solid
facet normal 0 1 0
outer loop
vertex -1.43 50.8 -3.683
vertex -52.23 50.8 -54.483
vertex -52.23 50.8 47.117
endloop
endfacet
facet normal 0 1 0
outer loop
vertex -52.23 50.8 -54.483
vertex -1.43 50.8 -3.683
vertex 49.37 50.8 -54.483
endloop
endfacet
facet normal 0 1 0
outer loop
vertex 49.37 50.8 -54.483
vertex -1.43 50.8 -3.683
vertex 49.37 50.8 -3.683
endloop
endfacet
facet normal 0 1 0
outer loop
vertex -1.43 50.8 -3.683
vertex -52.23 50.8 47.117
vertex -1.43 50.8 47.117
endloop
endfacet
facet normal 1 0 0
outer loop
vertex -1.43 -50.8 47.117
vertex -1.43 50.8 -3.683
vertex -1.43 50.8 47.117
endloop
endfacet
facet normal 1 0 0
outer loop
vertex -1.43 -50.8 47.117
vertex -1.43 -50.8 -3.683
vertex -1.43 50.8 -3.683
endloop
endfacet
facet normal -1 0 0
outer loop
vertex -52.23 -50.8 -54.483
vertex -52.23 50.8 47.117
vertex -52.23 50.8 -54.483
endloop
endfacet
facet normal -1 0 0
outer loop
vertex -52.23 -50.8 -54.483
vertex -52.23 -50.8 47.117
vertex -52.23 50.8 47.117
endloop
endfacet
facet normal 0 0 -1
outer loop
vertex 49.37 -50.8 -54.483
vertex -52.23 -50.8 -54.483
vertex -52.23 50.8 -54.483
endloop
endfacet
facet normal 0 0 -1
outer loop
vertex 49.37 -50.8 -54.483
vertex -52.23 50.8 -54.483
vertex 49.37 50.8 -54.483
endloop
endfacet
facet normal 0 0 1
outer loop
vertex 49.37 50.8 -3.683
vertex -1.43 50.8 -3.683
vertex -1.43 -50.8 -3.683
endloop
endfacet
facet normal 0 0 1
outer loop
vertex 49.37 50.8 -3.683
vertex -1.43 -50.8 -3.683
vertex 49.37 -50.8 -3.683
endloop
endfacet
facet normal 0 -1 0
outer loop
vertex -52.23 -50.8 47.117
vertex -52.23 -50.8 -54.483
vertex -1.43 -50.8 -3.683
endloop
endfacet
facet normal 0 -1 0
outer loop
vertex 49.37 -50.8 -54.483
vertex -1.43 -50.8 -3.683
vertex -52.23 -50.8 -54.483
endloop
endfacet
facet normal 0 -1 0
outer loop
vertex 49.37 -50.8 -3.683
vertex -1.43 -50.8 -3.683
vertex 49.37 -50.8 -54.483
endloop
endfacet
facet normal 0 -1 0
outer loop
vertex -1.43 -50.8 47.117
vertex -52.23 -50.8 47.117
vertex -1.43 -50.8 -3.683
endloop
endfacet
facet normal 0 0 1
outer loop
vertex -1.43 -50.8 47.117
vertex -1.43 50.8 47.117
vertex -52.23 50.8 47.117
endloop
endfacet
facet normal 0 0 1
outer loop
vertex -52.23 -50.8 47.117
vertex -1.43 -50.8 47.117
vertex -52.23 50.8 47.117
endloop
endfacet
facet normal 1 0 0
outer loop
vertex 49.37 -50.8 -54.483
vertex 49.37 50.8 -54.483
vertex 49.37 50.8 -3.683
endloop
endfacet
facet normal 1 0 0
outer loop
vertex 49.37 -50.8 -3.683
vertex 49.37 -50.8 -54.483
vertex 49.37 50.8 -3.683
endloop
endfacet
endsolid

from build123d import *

# Parameters (mm, degrees)
F0_W     = 50.8
F0_H     = 50.8
F1_DEPTH = 50.8


with BuildPart() as f1:
    # F0 (on Front) → F1 (new body, symmetric)
    with BuildSketch(Plane.XZ):
        Polygon((-52.229806, 47.116514), (-52.229806, -54.483486), (-1.429806, -54.483486), (-1.429806, -3.683486), (-1.429806, 47.116514), align=None)
        with Locations((23.970194, -29.083486)):
            Rectangle(F0_W, F0_H)
    extrude(amount=F1_DEPTH, both=True)


solid = f1.part
